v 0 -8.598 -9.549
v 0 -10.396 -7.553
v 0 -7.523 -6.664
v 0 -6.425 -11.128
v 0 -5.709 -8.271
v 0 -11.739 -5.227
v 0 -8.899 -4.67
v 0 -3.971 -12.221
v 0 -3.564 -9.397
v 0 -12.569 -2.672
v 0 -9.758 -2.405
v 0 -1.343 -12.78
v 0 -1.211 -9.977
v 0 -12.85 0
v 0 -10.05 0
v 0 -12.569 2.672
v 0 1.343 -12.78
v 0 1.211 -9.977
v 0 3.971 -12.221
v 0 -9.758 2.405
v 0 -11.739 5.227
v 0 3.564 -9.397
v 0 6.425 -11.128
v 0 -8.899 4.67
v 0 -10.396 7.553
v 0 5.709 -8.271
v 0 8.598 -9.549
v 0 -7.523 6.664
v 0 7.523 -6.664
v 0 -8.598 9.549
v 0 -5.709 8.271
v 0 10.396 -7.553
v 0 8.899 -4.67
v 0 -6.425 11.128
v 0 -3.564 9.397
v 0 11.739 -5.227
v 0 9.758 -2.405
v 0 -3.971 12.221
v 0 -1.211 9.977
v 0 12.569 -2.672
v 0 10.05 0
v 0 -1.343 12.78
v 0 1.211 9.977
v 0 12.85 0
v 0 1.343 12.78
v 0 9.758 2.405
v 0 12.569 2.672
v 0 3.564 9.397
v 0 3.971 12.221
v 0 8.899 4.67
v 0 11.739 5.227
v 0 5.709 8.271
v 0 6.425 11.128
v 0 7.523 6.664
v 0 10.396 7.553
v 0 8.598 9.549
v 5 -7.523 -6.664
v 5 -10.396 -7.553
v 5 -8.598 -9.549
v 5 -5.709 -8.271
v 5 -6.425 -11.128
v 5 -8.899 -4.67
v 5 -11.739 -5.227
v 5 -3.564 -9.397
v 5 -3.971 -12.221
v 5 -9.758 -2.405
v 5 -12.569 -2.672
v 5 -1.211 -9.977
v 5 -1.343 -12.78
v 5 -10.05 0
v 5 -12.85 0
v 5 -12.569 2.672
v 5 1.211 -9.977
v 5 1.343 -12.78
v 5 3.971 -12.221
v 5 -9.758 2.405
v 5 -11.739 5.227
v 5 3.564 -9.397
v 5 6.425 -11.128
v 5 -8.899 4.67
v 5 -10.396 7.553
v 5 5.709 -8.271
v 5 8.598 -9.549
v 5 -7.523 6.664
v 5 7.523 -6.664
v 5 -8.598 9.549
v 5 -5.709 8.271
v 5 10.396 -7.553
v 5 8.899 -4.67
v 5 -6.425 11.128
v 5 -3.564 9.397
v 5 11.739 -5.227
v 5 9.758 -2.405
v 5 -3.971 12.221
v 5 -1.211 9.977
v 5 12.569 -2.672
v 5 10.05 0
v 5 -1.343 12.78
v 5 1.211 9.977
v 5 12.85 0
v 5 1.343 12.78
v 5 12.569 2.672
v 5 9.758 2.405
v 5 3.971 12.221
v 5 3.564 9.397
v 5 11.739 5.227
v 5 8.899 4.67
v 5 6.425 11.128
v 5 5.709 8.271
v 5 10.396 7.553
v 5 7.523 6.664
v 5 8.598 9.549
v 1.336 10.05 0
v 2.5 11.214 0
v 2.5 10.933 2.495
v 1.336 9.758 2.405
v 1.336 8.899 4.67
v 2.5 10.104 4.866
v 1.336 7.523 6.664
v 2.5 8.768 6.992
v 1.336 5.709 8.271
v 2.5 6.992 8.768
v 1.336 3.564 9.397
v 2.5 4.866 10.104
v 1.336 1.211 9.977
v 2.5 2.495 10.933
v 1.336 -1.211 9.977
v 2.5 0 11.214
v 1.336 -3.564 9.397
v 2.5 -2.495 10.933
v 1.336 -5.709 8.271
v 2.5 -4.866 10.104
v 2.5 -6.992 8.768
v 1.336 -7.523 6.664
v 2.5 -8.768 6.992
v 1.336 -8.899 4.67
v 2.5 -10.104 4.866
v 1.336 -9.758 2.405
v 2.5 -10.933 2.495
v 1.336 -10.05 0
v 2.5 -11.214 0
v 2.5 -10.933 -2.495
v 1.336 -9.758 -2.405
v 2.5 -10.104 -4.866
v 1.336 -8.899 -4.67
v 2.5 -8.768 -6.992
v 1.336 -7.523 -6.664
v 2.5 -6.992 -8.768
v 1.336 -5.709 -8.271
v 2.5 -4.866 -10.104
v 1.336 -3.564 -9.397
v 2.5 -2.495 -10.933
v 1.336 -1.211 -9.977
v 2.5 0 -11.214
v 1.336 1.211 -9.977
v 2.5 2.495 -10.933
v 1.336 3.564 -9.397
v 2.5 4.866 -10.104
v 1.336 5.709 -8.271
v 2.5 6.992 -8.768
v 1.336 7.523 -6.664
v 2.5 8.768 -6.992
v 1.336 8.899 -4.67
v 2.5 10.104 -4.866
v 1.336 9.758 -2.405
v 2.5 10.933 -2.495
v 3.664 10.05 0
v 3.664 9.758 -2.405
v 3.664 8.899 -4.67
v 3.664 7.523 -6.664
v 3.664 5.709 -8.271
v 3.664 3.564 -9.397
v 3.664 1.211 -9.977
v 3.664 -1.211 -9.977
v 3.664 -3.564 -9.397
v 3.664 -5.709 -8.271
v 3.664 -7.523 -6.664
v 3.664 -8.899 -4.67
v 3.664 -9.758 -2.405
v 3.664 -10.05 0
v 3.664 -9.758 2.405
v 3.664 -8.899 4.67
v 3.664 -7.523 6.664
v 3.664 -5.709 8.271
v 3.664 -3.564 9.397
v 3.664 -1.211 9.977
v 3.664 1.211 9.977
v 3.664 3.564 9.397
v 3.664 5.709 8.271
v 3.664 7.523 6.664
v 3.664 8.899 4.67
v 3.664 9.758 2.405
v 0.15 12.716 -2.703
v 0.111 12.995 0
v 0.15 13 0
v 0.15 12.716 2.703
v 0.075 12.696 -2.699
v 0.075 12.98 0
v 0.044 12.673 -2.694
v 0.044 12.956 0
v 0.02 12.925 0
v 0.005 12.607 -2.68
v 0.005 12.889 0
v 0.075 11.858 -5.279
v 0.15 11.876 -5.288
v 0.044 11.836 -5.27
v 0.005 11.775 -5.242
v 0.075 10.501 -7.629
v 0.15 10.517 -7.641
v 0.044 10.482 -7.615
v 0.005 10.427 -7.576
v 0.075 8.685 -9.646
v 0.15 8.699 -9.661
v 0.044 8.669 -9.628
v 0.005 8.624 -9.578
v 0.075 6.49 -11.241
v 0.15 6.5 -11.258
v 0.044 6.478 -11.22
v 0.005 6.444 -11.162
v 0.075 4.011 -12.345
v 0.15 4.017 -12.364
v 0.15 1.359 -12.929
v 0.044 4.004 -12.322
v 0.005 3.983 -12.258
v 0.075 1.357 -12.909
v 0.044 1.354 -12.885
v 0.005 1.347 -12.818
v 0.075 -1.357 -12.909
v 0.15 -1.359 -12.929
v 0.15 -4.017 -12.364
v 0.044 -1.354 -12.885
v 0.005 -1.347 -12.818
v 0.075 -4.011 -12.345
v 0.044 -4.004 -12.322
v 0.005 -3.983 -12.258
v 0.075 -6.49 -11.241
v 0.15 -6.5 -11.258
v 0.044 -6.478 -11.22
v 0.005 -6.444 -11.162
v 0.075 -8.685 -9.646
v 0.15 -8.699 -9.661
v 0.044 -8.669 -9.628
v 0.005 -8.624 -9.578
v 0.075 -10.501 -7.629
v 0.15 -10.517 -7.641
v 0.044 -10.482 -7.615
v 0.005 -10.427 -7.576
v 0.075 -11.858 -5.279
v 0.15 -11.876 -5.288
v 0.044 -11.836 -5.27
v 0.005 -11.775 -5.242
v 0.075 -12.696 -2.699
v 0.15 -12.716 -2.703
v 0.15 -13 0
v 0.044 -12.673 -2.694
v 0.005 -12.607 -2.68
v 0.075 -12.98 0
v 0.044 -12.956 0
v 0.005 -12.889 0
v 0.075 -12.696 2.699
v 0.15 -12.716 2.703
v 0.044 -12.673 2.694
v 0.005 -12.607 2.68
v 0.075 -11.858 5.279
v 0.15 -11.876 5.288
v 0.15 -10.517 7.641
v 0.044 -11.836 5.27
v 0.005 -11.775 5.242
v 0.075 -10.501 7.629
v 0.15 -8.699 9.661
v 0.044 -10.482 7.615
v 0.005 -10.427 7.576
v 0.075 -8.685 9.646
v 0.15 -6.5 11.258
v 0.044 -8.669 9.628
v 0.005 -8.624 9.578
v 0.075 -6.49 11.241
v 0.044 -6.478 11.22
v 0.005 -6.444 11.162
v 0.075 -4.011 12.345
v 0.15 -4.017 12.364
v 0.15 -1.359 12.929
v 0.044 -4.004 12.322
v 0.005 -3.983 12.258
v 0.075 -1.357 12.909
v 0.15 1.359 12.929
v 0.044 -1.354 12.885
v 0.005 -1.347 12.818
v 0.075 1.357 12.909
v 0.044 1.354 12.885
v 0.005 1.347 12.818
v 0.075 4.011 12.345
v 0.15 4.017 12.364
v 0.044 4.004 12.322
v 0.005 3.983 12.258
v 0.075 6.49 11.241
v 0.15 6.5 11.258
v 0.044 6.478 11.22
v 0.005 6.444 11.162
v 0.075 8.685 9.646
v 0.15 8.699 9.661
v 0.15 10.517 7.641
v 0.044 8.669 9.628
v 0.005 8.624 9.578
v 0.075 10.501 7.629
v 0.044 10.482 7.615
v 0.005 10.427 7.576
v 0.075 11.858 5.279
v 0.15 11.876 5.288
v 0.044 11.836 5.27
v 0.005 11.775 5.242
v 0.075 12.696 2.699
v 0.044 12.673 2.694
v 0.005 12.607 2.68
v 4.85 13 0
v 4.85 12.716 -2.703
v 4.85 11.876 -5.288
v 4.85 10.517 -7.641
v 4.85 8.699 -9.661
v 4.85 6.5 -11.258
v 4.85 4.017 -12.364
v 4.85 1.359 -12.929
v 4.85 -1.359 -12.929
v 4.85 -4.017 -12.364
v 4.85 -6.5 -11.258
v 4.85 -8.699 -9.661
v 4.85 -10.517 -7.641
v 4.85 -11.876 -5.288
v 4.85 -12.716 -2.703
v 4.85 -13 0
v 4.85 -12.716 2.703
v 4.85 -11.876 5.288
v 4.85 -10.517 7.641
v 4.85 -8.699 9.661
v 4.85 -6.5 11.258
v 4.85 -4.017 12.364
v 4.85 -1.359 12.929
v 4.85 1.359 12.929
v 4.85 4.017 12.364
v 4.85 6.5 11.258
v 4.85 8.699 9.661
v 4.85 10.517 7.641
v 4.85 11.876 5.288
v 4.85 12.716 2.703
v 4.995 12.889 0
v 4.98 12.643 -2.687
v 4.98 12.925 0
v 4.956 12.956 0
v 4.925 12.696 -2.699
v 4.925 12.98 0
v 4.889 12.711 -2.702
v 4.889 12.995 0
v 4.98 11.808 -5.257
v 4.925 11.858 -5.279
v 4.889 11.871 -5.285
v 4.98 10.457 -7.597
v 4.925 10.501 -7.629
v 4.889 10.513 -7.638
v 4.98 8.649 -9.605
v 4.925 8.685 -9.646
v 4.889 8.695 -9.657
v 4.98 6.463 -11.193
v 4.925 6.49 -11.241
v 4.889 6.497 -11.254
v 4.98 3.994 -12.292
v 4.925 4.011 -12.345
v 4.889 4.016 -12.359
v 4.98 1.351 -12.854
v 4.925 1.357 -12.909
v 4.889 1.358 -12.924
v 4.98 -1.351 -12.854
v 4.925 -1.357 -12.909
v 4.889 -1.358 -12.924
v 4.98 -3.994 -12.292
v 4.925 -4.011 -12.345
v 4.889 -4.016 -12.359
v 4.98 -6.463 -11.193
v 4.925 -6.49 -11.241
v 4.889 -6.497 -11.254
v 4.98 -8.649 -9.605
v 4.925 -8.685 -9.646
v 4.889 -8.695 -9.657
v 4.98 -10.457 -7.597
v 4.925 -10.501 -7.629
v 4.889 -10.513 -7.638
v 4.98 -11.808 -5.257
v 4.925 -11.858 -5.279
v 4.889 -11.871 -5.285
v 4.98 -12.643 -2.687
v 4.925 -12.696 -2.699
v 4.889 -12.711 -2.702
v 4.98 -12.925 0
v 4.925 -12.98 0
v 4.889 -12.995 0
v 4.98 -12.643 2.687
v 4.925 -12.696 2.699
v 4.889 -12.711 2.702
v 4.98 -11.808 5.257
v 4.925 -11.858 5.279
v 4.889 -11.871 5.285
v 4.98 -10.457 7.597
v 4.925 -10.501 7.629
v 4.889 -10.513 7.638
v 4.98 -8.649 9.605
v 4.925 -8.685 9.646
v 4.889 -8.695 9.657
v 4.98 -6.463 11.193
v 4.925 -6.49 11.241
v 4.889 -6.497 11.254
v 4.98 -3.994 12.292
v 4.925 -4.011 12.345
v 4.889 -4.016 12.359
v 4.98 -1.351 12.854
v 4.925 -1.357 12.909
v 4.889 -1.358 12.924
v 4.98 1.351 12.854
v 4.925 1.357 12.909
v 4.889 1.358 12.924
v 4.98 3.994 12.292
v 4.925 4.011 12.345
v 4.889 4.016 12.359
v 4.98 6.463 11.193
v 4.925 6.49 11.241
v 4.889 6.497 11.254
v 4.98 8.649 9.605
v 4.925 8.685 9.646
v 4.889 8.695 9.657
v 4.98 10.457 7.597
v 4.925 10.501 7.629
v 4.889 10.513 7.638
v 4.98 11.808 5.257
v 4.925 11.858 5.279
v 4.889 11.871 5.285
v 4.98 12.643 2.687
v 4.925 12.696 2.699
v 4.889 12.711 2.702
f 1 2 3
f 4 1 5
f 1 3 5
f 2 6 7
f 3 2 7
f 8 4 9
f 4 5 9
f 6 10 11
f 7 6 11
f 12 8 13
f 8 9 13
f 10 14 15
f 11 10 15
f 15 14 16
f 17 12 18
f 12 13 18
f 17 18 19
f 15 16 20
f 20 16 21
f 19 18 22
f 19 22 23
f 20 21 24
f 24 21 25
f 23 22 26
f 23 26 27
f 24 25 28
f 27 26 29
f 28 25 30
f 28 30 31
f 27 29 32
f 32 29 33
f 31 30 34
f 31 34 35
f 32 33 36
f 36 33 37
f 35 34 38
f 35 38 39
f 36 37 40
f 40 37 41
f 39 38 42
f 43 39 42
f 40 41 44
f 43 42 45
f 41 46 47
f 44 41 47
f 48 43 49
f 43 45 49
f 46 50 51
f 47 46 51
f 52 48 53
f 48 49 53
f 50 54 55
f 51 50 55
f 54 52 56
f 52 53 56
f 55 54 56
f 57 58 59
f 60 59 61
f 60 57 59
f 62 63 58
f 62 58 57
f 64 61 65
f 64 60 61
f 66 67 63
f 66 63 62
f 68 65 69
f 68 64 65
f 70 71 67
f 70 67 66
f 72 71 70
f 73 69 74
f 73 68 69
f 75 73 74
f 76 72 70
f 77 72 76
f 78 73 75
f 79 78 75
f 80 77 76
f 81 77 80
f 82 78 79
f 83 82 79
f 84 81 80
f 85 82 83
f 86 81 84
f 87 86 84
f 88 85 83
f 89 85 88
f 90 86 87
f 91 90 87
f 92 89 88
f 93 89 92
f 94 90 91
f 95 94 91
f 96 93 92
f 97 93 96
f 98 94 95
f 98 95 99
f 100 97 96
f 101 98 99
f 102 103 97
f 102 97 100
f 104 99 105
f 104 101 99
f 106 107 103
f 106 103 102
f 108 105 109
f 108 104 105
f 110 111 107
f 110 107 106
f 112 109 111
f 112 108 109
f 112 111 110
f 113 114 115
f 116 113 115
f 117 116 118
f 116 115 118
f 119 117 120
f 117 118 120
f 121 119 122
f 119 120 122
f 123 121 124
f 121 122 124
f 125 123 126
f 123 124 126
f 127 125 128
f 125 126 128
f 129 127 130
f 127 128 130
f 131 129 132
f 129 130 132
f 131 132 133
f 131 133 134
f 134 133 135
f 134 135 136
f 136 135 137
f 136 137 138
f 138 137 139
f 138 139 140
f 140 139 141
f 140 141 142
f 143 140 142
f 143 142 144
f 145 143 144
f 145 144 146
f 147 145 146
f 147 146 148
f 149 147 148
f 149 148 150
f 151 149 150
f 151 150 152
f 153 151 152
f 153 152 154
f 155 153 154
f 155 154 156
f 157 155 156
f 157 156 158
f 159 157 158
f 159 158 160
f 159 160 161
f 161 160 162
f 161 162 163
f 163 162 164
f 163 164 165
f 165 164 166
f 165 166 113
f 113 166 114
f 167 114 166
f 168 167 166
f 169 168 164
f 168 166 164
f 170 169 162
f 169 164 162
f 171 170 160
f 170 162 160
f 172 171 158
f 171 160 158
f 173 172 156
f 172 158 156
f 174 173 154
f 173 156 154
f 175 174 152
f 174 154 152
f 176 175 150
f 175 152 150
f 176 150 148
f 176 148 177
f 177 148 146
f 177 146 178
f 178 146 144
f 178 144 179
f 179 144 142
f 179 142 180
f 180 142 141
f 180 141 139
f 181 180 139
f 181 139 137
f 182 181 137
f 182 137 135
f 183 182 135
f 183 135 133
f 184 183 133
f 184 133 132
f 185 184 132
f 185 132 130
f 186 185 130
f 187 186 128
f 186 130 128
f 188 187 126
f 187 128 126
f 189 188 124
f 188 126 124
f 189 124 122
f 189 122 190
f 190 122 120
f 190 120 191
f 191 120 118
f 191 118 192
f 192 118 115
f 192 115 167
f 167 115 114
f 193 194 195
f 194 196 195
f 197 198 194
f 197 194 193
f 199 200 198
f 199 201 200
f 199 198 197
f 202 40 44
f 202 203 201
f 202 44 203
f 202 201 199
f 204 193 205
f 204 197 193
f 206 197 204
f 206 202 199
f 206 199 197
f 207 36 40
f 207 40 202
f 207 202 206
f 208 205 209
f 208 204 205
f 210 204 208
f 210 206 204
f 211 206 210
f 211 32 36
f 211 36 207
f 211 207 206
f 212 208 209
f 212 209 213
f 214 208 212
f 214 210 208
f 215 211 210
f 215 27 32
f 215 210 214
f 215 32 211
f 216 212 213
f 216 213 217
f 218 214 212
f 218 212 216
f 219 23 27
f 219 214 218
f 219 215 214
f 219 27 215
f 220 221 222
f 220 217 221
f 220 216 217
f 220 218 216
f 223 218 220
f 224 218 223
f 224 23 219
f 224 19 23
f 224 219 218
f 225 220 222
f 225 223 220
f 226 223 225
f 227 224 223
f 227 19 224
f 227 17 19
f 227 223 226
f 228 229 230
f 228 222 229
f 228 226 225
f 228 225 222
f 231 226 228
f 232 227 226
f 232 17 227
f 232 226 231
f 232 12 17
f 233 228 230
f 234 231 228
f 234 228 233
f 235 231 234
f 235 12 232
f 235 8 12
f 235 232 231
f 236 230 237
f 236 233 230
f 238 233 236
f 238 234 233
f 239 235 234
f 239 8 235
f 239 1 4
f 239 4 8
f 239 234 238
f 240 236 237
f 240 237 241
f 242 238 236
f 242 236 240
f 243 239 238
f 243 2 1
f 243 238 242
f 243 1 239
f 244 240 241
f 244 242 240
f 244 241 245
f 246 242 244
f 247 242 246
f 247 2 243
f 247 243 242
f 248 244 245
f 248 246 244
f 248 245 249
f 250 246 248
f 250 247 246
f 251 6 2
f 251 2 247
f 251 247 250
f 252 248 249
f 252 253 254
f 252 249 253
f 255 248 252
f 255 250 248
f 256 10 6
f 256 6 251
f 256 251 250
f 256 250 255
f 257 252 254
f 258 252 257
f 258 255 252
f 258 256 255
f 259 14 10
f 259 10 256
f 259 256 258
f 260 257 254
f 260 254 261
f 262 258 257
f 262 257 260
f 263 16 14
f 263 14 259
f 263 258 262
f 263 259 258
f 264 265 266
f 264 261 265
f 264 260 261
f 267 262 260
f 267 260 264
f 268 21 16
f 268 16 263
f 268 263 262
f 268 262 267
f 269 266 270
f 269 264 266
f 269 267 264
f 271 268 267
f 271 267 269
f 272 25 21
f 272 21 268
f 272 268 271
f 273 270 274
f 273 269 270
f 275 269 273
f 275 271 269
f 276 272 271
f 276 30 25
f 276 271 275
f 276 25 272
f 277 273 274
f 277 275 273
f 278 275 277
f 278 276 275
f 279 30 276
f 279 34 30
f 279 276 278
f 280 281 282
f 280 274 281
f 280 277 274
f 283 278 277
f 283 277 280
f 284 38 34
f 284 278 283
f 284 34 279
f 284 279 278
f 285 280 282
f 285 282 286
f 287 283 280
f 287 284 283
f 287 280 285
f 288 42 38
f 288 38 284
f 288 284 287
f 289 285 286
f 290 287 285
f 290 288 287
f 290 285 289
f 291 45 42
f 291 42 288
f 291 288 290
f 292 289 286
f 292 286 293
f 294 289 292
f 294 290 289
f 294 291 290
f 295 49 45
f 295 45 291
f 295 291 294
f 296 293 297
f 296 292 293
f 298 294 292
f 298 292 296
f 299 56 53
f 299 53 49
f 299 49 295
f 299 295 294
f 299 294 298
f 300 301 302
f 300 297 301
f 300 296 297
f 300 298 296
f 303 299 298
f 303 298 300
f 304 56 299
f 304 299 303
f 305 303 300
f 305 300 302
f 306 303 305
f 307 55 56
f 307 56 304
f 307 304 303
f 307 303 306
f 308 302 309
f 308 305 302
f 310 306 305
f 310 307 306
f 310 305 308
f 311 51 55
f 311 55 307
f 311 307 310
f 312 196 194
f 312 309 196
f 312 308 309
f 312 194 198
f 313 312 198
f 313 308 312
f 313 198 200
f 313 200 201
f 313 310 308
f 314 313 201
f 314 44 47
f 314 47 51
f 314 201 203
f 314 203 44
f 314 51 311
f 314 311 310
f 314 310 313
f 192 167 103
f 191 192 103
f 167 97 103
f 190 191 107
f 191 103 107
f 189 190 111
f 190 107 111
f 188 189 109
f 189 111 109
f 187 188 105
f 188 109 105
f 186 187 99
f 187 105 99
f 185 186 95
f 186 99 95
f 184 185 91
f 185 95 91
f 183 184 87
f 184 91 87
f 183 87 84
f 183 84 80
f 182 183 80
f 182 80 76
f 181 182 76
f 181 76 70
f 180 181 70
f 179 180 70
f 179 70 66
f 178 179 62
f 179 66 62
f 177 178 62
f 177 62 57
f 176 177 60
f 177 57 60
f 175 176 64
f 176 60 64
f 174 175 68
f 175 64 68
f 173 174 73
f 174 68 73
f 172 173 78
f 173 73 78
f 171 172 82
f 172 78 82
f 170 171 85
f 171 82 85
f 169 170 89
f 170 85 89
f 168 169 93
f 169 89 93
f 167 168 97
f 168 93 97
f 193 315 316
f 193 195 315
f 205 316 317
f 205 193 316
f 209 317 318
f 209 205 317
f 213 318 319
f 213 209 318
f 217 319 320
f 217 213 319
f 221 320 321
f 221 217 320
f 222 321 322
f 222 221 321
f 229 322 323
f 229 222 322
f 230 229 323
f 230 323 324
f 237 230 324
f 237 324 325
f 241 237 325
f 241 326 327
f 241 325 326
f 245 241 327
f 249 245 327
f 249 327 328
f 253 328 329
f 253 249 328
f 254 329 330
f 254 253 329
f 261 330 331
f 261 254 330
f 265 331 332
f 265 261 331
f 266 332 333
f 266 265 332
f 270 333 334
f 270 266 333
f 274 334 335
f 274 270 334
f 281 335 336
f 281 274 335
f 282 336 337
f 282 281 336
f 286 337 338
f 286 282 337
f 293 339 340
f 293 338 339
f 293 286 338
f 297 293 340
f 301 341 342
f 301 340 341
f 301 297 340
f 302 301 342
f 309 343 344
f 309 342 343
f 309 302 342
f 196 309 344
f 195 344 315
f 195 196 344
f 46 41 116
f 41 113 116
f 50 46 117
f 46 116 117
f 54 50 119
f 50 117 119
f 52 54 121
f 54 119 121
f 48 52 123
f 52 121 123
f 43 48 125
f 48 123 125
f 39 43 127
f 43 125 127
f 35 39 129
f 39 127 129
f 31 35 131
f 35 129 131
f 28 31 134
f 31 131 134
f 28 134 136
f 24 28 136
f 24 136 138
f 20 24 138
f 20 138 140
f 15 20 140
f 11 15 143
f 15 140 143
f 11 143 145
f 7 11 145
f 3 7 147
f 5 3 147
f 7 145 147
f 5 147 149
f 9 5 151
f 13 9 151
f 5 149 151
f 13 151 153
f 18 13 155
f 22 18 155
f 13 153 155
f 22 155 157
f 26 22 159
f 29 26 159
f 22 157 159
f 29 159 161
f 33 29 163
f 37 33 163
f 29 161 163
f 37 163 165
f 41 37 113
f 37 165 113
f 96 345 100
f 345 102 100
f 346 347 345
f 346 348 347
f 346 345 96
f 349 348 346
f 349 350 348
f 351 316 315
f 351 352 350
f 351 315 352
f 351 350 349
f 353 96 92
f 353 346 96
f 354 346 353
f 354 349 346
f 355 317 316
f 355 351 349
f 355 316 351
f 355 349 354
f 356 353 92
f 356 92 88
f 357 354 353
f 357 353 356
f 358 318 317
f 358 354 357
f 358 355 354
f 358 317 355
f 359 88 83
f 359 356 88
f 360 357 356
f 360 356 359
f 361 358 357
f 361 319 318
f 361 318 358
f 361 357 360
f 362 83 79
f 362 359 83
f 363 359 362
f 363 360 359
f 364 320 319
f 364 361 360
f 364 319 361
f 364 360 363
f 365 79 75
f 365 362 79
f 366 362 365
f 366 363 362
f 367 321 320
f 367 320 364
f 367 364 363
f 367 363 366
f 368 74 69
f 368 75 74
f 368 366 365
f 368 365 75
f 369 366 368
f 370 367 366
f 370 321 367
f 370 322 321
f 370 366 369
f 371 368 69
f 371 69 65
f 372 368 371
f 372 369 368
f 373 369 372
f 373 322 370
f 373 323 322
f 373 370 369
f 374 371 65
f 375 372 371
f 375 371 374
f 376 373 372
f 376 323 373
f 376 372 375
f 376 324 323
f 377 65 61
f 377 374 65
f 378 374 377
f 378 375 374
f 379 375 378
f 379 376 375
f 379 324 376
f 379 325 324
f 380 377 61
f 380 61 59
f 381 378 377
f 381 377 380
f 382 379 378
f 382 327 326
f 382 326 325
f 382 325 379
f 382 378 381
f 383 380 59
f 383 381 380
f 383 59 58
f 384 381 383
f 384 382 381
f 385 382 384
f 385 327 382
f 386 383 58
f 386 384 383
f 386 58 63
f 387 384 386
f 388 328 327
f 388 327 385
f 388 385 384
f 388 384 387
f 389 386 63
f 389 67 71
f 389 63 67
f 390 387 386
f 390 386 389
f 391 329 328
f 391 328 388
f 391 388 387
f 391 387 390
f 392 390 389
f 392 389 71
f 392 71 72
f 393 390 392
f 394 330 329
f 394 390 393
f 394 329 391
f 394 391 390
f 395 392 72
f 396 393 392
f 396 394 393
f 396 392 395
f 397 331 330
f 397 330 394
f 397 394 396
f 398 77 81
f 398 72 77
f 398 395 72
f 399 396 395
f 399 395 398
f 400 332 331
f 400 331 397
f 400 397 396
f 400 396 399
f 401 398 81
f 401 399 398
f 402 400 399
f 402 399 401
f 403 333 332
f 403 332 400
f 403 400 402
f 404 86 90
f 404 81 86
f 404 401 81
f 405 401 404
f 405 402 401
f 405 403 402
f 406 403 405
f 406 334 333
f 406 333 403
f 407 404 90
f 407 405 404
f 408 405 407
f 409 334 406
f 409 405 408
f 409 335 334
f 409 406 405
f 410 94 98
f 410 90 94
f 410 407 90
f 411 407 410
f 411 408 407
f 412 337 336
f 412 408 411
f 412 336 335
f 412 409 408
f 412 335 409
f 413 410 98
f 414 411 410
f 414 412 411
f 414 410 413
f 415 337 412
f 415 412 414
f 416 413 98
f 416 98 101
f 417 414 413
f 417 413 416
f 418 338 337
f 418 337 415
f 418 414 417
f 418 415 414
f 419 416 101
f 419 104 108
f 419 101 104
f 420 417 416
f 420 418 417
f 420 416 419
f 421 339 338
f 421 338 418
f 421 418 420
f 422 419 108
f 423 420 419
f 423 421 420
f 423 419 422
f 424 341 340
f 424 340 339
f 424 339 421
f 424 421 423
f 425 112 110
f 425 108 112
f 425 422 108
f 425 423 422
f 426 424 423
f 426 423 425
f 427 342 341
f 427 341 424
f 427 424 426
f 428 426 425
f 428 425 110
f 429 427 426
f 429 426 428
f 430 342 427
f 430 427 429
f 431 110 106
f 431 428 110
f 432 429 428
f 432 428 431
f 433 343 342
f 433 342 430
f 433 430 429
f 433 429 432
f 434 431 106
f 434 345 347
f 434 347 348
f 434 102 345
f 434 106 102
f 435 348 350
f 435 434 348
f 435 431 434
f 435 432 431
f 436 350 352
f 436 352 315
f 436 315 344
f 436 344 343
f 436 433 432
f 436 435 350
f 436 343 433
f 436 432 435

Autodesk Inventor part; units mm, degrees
ref_plane "YZ Plane" through (0, 0, 0) normal (1, 0, 0) x (0, 1, 0)
ref_plane "XZ Plane" through (0, 0, 0) normal (0, 1, 0) x (-1, 0, 0)
ref_plane "XY Plane" through (0, 0, 0) normal (0, 0, 1) x (1, 0, 0)
sketch "Sketch_1" plane through (0, 0, 0) normal (0, 0, 1) x (1, 0, 0)
  line L0 (5, 0) -> (0, 0)
  line L1 (0, 10.05) -> (5, 10.05)
  line L2 (5, 10.05) -> (5, 12.85)
  arc A0 (5, 12.85) -> (4.85, 13) centre (4.85, 12.85) ccw
  line L3 (4.85, 13) -> (0.15, 13)
  arc A1 (0.15, 13) -> (0, 12.85) centre (0.15, 12.85) ccw
  line L4 (0, 12.85) -> (0, 10.05)
revolve "Revolution1" add sketch "Sketch_1" angle 360 about axis through (5, 0, 0) along (1, 0, 0)
sketch "Sketch_4" plane through (0, 0, 0) normal (0, 0, 1) x (1, 0, 0)
  line L0 (3.5, 0) -> (1.5, 0)
  line L1 (1.0858, 9.8) -> (2.5, 8.3858)
  line L2 (2.5, 8.3858) -> (3.9142, 9.8)
  line L3 (3.9142, 9.8) -> (2.5, 11.2142)
  line L4 (2.5, 11.2142) -> (1.0858, 9.8)
revolve "Revolution2" cut sketch "Sketch_4" angle 360 about axis through (3.5, 0, 0) along (1, 0, 0)
properties part number "CRBT155A_PART2" material "ステンレス鋼"
